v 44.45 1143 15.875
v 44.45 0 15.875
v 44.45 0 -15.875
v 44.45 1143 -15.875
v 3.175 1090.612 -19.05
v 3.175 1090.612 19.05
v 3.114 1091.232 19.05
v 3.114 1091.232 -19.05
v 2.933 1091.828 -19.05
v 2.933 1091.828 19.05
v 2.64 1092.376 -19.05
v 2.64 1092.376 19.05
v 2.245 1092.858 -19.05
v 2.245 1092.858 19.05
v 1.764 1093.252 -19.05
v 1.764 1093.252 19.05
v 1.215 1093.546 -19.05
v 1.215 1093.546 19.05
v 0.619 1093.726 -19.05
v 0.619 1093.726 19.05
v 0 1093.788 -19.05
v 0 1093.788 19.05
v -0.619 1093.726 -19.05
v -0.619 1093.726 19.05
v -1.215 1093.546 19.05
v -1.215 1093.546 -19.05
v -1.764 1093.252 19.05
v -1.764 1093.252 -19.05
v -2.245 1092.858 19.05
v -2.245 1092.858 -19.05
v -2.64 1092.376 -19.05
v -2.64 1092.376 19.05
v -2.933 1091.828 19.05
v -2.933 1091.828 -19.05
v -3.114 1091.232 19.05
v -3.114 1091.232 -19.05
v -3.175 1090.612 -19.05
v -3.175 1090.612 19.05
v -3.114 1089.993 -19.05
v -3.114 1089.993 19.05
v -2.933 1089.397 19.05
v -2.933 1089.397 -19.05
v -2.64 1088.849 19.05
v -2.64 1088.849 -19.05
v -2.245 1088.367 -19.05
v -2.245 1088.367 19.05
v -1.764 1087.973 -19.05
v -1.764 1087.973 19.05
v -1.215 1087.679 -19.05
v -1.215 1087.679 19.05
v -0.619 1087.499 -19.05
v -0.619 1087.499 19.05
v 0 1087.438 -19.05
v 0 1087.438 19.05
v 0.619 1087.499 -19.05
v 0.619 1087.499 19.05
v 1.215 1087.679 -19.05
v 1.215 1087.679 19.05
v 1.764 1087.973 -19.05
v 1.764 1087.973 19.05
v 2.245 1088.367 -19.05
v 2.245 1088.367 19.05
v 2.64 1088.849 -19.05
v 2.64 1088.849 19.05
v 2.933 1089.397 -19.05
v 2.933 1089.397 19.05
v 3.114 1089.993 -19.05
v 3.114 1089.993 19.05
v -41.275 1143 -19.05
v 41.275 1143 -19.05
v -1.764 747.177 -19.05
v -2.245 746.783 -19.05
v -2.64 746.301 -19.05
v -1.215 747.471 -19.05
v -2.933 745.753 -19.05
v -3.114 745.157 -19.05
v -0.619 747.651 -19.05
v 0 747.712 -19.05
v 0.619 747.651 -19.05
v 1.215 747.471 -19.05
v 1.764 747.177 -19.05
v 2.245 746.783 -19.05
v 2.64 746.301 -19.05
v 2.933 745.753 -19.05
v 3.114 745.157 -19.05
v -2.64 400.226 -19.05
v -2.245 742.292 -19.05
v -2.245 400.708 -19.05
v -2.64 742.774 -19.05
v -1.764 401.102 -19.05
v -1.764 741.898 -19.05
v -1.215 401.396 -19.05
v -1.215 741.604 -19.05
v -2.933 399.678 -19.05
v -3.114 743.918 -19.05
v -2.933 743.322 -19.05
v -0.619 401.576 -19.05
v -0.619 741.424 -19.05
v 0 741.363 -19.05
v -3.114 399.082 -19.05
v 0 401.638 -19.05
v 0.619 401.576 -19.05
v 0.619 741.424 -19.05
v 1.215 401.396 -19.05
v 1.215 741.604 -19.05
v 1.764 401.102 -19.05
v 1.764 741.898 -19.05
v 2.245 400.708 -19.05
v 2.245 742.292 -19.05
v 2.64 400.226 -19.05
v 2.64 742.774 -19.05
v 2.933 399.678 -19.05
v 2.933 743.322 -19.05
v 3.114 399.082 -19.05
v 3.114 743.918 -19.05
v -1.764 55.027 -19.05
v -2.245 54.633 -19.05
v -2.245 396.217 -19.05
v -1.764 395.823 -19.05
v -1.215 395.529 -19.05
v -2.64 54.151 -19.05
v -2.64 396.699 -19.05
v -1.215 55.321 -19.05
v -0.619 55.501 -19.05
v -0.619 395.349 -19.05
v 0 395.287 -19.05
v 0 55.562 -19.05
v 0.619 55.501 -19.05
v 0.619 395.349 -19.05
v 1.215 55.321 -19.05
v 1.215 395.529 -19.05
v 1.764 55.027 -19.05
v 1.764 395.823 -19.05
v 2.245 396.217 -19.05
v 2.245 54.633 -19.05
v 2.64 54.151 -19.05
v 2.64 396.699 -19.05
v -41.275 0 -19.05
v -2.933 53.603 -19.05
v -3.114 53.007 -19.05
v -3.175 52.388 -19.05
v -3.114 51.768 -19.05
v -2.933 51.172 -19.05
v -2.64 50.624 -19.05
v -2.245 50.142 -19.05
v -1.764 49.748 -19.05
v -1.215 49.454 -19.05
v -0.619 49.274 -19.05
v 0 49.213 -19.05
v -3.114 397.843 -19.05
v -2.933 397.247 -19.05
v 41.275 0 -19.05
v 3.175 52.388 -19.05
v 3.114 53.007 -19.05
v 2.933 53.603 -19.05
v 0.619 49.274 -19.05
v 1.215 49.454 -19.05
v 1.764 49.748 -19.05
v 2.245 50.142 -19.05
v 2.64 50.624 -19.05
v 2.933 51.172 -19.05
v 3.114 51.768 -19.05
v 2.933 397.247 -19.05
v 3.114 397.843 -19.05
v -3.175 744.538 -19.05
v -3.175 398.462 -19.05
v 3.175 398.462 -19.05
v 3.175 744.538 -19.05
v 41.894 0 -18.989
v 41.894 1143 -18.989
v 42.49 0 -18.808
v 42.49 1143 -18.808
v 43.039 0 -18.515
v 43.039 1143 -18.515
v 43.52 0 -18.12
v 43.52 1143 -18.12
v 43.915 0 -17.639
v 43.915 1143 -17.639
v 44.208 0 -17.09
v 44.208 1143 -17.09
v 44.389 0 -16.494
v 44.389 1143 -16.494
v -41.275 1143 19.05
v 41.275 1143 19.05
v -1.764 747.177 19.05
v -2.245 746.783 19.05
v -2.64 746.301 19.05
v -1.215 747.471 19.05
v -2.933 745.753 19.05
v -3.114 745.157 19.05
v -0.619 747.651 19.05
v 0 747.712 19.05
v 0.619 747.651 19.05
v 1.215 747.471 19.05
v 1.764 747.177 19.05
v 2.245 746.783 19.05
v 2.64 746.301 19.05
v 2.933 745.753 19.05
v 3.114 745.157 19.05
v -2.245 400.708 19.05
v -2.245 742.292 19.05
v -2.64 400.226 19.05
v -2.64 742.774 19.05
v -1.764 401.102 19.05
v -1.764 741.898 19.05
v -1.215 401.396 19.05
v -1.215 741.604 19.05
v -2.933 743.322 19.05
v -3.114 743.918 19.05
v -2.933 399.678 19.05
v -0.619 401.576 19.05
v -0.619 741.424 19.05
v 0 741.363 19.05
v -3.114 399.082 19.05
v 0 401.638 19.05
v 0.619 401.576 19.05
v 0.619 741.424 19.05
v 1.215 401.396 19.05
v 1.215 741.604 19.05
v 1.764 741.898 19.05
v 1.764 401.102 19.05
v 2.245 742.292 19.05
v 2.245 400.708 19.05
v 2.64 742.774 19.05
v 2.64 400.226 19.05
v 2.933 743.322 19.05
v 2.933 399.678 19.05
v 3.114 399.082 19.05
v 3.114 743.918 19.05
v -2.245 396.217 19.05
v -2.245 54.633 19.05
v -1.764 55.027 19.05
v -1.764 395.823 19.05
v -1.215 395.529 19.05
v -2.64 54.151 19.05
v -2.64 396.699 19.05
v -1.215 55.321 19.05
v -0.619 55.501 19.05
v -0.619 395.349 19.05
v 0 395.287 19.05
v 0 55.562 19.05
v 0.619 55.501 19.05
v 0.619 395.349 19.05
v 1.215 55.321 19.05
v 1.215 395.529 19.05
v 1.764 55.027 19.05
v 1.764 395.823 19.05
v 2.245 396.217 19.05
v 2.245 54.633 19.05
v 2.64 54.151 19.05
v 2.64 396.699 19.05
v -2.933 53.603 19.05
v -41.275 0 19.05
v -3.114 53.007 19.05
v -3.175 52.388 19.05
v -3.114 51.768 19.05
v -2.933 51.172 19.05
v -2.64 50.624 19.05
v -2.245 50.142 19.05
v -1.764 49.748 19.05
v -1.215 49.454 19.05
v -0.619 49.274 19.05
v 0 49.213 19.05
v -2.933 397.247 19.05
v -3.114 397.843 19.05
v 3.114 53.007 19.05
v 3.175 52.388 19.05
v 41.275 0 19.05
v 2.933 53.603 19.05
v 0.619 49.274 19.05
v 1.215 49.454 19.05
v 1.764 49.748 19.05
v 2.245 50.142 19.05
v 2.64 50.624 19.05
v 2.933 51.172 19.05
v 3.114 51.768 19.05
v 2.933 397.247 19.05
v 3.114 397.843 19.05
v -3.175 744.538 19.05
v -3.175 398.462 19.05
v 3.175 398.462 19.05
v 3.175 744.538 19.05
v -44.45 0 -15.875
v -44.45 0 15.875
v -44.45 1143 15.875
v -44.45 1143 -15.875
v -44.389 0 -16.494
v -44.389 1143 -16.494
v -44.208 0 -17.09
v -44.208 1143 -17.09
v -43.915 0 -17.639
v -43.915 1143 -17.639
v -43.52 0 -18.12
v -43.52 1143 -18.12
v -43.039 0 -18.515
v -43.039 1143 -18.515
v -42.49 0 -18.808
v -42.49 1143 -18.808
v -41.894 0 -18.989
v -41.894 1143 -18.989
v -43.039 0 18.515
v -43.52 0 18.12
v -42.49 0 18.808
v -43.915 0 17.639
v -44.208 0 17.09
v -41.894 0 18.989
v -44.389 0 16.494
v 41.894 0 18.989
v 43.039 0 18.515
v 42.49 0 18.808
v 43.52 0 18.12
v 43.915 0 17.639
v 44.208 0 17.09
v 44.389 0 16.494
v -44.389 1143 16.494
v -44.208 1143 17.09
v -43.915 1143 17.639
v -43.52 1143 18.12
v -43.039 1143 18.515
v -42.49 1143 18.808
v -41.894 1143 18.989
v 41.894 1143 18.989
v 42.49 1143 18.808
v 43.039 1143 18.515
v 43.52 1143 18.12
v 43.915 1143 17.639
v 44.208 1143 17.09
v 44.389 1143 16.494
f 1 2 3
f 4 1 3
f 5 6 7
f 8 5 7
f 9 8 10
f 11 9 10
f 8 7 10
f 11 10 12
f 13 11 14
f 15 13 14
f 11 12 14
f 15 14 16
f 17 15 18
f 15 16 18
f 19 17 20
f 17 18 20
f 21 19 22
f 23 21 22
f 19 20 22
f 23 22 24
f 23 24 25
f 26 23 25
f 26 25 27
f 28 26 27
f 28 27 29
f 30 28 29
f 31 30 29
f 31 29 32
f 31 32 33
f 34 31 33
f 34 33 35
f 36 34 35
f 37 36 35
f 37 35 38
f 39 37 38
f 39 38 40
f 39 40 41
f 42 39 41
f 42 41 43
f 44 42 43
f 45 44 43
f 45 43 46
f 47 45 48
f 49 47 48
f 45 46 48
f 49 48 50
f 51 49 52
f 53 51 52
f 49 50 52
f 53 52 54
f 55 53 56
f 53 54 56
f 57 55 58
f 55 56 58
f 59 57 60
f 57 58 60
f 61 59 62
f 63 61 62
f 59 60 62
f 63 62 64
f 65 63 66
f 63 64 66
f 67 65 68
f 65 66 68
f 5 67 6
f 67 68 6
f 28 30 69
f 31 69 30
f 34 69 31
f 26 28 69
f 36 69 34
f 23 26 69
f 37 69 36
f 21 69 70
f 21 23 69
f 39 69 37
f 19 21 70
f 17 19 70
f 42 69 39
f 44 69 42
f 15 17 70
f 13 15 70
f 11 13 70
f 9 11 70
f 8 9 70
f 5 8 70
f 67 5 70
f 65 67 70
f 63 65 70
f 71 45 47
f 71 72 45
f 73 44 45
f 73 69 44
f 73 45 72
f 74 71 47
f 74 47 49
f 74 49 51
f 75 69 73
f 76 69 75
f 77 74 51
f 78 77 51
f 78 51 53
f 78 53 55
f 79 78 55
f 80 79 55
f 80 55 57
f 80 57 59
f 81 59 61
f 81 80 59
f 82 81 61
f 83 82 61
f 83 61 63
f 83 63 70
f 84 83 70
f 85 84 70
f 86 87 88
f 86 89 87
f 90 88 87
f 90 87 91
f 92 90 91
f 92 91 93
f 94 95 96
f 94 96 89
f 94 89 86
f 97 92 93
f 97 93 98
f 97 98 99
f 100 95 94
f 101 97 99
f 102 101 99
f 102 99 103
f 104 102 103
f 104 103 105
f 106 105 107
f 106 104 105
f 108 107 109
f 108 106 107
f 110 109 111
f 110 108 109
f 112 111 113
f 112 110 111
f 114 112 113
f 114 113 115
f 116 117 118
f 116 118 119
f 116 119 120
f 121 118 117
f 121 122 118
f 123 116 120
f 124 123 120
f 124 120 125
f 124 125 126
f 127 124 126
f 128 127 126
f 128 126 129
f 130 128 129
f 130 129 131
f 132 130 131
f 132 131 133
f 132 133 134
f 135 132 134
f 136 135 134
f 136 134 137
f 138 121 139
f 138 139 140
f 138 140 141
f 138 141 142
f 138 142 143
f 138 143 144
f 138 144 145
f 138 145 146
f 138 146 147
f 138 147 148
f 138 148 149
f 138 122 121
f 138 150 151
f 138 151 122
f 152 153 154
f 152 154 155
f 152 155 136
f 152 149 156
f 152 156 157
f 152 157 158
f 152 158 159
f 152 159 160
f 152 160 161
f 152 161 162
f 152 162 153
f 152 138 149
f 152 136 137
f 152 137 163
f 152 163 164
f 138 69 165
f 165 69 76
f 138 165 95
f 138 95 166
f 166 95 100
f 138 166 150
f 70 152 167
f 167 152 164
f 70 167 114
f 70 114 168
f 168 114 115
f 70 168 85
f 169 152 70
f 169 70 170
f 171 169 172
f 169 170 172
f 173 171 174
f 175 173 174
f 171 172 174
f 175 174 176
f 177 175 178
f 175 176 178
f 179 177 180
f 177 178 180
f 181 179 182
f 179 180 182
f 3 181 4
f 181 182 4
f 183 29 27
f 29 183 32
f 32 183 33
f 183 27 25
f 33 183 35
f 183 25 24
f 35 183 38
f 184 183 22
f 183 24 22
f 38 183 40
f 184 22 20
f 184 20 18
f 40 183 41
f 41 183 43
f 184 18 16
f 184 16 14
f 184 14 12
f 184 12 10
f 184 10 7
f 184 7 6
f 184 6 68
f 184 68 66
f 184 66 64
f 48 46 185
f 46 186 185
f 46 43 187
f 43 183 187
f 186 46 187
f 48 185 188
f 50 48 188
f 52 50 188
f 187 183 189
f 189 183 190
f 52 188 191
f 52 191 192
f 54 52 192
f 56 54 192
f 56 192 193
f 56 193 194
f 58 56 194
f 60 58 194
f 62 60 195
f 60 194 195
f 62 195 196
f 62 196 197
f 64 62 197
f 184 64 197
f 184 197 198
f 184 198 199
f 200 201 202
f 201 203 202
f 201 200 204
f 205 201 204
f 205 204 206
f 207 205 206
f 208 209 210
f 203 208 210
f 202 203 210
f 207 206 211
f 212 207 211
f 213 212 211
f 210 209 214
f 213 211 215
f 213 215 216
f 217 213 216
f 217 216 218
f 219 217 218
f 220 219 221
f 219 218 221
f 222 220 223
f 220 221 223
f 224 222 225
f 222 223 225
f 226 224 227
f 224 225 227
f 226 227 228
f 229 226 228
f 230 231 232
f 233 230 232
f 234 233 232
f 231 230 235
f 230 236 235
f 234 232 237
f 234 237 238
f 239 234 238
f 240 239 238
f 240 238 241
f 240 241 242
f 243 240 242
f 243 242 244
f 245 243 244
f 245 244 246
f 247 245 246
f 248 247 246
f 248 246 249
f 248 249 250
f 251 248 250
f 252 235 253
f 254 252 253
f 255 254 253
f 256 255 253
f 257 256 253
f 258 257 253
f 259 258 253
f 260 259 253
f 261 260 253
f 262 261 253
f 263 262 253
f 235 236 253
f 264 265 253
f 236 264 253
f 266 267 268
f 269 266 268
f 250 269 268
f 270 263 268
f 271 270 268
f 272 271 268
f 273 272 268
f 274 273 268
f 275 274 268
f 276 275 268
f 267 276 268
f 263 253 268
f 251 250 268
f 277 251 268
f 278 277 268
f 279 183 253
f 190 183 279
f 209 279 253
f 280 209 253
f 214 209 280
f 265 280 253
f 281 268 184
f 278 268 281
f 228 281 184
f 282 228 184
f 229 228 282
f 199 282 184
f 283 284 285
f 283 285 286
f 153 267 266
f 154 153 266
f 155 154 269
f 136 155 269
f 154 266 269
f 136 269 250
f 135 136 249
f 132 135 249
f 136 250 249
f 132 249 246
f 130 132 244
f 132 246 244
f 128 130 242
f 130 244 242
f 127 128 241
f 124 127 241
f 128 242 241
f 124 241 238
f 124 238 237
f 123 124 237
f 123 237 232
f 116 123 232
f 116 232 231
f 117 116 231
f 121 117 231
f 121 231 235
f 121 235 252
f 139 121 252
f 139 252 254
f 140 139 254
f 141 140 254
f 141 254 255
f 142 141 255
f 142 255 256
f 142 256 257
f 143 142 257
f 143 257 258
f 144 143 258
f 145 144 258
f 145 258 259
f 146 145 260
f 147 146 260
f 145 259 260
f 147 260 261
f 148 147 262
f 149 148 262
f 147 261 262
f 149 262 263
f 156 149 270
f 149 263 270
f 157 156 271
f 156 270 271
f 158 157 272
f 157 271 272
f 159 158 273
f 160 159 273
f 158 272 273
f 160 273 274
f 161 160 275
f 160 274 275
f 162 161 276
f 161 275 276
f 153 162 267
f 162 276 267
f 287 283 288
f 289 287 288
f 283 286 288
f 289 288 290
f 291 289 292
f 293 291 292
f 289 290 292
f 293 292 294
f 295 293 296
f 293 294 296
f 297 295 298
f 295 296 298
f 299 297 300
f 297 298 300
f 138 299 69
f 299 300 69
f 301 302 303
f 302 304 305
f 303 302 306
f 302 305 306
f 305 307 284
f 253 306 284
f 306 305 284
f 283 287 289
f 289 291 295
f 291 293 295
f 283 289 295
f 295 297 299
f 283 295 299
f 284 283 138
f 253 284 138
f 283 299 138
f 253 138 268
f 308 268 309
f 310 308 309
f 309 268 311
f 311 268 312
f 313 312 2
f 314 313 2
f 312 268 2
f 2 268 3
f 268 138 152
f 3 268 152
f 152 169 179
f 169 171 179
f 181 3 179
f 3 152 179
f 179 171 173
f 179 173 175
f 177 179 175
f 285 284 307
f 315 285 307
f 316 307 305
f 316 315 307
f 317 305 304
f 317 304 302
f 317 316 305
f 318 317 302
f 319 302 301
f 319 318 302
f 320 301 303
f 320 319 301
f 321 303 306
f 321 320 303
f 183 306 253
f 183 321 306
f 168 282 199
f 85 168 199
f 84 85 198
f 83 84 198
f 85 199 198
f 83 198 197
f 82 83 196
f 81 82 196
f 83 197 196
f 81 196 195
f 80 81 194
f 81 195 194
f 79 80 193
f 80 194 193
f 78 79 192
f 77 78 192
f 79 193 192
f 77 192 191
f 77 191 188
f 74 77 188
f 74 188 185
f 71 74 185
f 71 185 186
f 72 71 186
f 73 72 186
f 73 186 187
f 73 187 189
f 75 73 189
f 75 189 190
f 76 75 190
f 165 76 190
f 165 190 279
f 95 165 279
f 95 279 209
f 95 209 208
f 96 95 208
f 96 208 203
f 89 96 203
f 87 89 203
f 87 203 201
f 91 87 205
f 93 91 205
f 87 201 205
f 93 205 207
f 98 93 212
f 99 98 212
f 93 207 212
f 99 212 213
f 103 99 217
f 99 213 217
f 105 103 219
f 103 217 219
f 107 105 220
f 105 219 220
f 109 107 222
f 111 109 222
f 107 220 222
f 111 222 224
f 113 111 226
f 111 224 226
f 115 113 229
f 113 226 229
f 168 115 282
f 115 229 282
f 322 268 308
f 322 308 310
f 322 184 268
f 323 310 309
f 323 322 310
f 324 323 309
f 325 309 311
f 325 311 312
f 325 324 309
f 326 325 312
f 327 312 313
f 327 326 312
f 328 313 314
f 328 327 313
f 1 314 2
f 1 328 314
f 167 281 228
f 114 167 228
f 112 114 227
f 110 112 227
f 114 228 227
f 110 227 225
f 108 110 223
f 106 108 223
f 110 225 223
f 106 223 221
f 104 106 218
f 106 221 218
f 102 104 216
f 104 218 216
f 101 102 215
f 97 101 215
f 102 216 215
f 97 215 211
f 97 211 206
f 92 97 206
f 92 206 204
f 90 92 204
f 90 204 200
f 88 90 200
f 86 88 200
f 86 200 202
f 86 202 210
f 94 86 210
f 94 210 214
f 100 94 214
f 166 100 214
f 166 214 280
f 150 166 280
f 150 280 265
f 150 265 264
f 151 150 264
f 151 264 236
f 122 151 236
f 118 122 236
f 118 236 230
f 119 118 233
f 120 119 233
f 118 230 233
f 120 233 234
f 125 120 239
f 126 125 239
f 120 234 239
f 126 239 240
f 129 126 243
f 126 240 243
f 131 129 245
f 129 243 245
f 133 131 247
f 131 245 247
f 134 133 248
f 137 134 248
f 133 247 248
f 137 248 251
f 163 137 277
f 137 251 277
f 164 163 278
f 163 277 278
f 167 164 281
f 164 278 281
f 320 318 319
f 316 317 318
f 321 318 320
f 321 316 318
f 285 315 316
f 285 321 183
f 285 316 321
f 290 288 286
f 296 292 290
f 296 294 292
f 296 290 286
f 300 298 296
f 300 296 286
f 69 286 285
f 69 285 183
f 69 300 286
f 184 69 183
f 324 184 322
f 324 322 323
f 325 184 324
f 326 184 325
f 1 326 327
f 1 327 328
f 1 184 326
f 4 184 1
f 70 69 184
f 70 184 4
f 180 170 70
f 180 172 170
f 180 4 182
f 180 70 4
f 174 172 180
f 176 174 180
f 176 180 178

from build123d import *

# Parameters (mm, degrees)
SKETCH1_W                   = 88.9
SKETCH1_H                   = 38.1
BOSS_EXTRUDE1_DEPTH         = 1143
F_1_4_0_25_DIAMETER_HOLE1_D = 6.35
FILLET1_R                   = 3.175


with BuildPart() as part:
    # Sketch1 → Boss-Extrude1 (new body)
    with BuildSketch(Plane(origin=(0, 0, 0), x_dir=(1, 0, 0), z_dir=(0, 1, 0))):
        Rectangle(SKETCH1_W, SKETCH1_H)
    extrude(amount=BOSS_EXTRUDE1_DEPTH)

    # 1/4 (0.25) Diameter Hole1 (through all)
    with Locations(Plane(origin=(0, 0, -19.05), x_dir=(-1, 0, 0), z_dir=(0, 0, -1))):
        with Locations((0, 52.3875), (0, 398.4625), (0, 744.5375), (0, 1090.6125)):
            Hole(F_1_4_0_25_DIAMETER_HOLE1_D / 2)

    # Fillet1
    fillet1_edges = [part.edges().sort_by_distance(p)[0] for p in [
        (-44.45, 571.5, -19.05),
        (44.45, 571.5, -19.05),
        (44.45, 571.5, 19.05),
        (-44.45, 571.5, 19.05),
    ]]
    fillet(fillet1_edges, radius=FILLET1_R)


solid = part.part
